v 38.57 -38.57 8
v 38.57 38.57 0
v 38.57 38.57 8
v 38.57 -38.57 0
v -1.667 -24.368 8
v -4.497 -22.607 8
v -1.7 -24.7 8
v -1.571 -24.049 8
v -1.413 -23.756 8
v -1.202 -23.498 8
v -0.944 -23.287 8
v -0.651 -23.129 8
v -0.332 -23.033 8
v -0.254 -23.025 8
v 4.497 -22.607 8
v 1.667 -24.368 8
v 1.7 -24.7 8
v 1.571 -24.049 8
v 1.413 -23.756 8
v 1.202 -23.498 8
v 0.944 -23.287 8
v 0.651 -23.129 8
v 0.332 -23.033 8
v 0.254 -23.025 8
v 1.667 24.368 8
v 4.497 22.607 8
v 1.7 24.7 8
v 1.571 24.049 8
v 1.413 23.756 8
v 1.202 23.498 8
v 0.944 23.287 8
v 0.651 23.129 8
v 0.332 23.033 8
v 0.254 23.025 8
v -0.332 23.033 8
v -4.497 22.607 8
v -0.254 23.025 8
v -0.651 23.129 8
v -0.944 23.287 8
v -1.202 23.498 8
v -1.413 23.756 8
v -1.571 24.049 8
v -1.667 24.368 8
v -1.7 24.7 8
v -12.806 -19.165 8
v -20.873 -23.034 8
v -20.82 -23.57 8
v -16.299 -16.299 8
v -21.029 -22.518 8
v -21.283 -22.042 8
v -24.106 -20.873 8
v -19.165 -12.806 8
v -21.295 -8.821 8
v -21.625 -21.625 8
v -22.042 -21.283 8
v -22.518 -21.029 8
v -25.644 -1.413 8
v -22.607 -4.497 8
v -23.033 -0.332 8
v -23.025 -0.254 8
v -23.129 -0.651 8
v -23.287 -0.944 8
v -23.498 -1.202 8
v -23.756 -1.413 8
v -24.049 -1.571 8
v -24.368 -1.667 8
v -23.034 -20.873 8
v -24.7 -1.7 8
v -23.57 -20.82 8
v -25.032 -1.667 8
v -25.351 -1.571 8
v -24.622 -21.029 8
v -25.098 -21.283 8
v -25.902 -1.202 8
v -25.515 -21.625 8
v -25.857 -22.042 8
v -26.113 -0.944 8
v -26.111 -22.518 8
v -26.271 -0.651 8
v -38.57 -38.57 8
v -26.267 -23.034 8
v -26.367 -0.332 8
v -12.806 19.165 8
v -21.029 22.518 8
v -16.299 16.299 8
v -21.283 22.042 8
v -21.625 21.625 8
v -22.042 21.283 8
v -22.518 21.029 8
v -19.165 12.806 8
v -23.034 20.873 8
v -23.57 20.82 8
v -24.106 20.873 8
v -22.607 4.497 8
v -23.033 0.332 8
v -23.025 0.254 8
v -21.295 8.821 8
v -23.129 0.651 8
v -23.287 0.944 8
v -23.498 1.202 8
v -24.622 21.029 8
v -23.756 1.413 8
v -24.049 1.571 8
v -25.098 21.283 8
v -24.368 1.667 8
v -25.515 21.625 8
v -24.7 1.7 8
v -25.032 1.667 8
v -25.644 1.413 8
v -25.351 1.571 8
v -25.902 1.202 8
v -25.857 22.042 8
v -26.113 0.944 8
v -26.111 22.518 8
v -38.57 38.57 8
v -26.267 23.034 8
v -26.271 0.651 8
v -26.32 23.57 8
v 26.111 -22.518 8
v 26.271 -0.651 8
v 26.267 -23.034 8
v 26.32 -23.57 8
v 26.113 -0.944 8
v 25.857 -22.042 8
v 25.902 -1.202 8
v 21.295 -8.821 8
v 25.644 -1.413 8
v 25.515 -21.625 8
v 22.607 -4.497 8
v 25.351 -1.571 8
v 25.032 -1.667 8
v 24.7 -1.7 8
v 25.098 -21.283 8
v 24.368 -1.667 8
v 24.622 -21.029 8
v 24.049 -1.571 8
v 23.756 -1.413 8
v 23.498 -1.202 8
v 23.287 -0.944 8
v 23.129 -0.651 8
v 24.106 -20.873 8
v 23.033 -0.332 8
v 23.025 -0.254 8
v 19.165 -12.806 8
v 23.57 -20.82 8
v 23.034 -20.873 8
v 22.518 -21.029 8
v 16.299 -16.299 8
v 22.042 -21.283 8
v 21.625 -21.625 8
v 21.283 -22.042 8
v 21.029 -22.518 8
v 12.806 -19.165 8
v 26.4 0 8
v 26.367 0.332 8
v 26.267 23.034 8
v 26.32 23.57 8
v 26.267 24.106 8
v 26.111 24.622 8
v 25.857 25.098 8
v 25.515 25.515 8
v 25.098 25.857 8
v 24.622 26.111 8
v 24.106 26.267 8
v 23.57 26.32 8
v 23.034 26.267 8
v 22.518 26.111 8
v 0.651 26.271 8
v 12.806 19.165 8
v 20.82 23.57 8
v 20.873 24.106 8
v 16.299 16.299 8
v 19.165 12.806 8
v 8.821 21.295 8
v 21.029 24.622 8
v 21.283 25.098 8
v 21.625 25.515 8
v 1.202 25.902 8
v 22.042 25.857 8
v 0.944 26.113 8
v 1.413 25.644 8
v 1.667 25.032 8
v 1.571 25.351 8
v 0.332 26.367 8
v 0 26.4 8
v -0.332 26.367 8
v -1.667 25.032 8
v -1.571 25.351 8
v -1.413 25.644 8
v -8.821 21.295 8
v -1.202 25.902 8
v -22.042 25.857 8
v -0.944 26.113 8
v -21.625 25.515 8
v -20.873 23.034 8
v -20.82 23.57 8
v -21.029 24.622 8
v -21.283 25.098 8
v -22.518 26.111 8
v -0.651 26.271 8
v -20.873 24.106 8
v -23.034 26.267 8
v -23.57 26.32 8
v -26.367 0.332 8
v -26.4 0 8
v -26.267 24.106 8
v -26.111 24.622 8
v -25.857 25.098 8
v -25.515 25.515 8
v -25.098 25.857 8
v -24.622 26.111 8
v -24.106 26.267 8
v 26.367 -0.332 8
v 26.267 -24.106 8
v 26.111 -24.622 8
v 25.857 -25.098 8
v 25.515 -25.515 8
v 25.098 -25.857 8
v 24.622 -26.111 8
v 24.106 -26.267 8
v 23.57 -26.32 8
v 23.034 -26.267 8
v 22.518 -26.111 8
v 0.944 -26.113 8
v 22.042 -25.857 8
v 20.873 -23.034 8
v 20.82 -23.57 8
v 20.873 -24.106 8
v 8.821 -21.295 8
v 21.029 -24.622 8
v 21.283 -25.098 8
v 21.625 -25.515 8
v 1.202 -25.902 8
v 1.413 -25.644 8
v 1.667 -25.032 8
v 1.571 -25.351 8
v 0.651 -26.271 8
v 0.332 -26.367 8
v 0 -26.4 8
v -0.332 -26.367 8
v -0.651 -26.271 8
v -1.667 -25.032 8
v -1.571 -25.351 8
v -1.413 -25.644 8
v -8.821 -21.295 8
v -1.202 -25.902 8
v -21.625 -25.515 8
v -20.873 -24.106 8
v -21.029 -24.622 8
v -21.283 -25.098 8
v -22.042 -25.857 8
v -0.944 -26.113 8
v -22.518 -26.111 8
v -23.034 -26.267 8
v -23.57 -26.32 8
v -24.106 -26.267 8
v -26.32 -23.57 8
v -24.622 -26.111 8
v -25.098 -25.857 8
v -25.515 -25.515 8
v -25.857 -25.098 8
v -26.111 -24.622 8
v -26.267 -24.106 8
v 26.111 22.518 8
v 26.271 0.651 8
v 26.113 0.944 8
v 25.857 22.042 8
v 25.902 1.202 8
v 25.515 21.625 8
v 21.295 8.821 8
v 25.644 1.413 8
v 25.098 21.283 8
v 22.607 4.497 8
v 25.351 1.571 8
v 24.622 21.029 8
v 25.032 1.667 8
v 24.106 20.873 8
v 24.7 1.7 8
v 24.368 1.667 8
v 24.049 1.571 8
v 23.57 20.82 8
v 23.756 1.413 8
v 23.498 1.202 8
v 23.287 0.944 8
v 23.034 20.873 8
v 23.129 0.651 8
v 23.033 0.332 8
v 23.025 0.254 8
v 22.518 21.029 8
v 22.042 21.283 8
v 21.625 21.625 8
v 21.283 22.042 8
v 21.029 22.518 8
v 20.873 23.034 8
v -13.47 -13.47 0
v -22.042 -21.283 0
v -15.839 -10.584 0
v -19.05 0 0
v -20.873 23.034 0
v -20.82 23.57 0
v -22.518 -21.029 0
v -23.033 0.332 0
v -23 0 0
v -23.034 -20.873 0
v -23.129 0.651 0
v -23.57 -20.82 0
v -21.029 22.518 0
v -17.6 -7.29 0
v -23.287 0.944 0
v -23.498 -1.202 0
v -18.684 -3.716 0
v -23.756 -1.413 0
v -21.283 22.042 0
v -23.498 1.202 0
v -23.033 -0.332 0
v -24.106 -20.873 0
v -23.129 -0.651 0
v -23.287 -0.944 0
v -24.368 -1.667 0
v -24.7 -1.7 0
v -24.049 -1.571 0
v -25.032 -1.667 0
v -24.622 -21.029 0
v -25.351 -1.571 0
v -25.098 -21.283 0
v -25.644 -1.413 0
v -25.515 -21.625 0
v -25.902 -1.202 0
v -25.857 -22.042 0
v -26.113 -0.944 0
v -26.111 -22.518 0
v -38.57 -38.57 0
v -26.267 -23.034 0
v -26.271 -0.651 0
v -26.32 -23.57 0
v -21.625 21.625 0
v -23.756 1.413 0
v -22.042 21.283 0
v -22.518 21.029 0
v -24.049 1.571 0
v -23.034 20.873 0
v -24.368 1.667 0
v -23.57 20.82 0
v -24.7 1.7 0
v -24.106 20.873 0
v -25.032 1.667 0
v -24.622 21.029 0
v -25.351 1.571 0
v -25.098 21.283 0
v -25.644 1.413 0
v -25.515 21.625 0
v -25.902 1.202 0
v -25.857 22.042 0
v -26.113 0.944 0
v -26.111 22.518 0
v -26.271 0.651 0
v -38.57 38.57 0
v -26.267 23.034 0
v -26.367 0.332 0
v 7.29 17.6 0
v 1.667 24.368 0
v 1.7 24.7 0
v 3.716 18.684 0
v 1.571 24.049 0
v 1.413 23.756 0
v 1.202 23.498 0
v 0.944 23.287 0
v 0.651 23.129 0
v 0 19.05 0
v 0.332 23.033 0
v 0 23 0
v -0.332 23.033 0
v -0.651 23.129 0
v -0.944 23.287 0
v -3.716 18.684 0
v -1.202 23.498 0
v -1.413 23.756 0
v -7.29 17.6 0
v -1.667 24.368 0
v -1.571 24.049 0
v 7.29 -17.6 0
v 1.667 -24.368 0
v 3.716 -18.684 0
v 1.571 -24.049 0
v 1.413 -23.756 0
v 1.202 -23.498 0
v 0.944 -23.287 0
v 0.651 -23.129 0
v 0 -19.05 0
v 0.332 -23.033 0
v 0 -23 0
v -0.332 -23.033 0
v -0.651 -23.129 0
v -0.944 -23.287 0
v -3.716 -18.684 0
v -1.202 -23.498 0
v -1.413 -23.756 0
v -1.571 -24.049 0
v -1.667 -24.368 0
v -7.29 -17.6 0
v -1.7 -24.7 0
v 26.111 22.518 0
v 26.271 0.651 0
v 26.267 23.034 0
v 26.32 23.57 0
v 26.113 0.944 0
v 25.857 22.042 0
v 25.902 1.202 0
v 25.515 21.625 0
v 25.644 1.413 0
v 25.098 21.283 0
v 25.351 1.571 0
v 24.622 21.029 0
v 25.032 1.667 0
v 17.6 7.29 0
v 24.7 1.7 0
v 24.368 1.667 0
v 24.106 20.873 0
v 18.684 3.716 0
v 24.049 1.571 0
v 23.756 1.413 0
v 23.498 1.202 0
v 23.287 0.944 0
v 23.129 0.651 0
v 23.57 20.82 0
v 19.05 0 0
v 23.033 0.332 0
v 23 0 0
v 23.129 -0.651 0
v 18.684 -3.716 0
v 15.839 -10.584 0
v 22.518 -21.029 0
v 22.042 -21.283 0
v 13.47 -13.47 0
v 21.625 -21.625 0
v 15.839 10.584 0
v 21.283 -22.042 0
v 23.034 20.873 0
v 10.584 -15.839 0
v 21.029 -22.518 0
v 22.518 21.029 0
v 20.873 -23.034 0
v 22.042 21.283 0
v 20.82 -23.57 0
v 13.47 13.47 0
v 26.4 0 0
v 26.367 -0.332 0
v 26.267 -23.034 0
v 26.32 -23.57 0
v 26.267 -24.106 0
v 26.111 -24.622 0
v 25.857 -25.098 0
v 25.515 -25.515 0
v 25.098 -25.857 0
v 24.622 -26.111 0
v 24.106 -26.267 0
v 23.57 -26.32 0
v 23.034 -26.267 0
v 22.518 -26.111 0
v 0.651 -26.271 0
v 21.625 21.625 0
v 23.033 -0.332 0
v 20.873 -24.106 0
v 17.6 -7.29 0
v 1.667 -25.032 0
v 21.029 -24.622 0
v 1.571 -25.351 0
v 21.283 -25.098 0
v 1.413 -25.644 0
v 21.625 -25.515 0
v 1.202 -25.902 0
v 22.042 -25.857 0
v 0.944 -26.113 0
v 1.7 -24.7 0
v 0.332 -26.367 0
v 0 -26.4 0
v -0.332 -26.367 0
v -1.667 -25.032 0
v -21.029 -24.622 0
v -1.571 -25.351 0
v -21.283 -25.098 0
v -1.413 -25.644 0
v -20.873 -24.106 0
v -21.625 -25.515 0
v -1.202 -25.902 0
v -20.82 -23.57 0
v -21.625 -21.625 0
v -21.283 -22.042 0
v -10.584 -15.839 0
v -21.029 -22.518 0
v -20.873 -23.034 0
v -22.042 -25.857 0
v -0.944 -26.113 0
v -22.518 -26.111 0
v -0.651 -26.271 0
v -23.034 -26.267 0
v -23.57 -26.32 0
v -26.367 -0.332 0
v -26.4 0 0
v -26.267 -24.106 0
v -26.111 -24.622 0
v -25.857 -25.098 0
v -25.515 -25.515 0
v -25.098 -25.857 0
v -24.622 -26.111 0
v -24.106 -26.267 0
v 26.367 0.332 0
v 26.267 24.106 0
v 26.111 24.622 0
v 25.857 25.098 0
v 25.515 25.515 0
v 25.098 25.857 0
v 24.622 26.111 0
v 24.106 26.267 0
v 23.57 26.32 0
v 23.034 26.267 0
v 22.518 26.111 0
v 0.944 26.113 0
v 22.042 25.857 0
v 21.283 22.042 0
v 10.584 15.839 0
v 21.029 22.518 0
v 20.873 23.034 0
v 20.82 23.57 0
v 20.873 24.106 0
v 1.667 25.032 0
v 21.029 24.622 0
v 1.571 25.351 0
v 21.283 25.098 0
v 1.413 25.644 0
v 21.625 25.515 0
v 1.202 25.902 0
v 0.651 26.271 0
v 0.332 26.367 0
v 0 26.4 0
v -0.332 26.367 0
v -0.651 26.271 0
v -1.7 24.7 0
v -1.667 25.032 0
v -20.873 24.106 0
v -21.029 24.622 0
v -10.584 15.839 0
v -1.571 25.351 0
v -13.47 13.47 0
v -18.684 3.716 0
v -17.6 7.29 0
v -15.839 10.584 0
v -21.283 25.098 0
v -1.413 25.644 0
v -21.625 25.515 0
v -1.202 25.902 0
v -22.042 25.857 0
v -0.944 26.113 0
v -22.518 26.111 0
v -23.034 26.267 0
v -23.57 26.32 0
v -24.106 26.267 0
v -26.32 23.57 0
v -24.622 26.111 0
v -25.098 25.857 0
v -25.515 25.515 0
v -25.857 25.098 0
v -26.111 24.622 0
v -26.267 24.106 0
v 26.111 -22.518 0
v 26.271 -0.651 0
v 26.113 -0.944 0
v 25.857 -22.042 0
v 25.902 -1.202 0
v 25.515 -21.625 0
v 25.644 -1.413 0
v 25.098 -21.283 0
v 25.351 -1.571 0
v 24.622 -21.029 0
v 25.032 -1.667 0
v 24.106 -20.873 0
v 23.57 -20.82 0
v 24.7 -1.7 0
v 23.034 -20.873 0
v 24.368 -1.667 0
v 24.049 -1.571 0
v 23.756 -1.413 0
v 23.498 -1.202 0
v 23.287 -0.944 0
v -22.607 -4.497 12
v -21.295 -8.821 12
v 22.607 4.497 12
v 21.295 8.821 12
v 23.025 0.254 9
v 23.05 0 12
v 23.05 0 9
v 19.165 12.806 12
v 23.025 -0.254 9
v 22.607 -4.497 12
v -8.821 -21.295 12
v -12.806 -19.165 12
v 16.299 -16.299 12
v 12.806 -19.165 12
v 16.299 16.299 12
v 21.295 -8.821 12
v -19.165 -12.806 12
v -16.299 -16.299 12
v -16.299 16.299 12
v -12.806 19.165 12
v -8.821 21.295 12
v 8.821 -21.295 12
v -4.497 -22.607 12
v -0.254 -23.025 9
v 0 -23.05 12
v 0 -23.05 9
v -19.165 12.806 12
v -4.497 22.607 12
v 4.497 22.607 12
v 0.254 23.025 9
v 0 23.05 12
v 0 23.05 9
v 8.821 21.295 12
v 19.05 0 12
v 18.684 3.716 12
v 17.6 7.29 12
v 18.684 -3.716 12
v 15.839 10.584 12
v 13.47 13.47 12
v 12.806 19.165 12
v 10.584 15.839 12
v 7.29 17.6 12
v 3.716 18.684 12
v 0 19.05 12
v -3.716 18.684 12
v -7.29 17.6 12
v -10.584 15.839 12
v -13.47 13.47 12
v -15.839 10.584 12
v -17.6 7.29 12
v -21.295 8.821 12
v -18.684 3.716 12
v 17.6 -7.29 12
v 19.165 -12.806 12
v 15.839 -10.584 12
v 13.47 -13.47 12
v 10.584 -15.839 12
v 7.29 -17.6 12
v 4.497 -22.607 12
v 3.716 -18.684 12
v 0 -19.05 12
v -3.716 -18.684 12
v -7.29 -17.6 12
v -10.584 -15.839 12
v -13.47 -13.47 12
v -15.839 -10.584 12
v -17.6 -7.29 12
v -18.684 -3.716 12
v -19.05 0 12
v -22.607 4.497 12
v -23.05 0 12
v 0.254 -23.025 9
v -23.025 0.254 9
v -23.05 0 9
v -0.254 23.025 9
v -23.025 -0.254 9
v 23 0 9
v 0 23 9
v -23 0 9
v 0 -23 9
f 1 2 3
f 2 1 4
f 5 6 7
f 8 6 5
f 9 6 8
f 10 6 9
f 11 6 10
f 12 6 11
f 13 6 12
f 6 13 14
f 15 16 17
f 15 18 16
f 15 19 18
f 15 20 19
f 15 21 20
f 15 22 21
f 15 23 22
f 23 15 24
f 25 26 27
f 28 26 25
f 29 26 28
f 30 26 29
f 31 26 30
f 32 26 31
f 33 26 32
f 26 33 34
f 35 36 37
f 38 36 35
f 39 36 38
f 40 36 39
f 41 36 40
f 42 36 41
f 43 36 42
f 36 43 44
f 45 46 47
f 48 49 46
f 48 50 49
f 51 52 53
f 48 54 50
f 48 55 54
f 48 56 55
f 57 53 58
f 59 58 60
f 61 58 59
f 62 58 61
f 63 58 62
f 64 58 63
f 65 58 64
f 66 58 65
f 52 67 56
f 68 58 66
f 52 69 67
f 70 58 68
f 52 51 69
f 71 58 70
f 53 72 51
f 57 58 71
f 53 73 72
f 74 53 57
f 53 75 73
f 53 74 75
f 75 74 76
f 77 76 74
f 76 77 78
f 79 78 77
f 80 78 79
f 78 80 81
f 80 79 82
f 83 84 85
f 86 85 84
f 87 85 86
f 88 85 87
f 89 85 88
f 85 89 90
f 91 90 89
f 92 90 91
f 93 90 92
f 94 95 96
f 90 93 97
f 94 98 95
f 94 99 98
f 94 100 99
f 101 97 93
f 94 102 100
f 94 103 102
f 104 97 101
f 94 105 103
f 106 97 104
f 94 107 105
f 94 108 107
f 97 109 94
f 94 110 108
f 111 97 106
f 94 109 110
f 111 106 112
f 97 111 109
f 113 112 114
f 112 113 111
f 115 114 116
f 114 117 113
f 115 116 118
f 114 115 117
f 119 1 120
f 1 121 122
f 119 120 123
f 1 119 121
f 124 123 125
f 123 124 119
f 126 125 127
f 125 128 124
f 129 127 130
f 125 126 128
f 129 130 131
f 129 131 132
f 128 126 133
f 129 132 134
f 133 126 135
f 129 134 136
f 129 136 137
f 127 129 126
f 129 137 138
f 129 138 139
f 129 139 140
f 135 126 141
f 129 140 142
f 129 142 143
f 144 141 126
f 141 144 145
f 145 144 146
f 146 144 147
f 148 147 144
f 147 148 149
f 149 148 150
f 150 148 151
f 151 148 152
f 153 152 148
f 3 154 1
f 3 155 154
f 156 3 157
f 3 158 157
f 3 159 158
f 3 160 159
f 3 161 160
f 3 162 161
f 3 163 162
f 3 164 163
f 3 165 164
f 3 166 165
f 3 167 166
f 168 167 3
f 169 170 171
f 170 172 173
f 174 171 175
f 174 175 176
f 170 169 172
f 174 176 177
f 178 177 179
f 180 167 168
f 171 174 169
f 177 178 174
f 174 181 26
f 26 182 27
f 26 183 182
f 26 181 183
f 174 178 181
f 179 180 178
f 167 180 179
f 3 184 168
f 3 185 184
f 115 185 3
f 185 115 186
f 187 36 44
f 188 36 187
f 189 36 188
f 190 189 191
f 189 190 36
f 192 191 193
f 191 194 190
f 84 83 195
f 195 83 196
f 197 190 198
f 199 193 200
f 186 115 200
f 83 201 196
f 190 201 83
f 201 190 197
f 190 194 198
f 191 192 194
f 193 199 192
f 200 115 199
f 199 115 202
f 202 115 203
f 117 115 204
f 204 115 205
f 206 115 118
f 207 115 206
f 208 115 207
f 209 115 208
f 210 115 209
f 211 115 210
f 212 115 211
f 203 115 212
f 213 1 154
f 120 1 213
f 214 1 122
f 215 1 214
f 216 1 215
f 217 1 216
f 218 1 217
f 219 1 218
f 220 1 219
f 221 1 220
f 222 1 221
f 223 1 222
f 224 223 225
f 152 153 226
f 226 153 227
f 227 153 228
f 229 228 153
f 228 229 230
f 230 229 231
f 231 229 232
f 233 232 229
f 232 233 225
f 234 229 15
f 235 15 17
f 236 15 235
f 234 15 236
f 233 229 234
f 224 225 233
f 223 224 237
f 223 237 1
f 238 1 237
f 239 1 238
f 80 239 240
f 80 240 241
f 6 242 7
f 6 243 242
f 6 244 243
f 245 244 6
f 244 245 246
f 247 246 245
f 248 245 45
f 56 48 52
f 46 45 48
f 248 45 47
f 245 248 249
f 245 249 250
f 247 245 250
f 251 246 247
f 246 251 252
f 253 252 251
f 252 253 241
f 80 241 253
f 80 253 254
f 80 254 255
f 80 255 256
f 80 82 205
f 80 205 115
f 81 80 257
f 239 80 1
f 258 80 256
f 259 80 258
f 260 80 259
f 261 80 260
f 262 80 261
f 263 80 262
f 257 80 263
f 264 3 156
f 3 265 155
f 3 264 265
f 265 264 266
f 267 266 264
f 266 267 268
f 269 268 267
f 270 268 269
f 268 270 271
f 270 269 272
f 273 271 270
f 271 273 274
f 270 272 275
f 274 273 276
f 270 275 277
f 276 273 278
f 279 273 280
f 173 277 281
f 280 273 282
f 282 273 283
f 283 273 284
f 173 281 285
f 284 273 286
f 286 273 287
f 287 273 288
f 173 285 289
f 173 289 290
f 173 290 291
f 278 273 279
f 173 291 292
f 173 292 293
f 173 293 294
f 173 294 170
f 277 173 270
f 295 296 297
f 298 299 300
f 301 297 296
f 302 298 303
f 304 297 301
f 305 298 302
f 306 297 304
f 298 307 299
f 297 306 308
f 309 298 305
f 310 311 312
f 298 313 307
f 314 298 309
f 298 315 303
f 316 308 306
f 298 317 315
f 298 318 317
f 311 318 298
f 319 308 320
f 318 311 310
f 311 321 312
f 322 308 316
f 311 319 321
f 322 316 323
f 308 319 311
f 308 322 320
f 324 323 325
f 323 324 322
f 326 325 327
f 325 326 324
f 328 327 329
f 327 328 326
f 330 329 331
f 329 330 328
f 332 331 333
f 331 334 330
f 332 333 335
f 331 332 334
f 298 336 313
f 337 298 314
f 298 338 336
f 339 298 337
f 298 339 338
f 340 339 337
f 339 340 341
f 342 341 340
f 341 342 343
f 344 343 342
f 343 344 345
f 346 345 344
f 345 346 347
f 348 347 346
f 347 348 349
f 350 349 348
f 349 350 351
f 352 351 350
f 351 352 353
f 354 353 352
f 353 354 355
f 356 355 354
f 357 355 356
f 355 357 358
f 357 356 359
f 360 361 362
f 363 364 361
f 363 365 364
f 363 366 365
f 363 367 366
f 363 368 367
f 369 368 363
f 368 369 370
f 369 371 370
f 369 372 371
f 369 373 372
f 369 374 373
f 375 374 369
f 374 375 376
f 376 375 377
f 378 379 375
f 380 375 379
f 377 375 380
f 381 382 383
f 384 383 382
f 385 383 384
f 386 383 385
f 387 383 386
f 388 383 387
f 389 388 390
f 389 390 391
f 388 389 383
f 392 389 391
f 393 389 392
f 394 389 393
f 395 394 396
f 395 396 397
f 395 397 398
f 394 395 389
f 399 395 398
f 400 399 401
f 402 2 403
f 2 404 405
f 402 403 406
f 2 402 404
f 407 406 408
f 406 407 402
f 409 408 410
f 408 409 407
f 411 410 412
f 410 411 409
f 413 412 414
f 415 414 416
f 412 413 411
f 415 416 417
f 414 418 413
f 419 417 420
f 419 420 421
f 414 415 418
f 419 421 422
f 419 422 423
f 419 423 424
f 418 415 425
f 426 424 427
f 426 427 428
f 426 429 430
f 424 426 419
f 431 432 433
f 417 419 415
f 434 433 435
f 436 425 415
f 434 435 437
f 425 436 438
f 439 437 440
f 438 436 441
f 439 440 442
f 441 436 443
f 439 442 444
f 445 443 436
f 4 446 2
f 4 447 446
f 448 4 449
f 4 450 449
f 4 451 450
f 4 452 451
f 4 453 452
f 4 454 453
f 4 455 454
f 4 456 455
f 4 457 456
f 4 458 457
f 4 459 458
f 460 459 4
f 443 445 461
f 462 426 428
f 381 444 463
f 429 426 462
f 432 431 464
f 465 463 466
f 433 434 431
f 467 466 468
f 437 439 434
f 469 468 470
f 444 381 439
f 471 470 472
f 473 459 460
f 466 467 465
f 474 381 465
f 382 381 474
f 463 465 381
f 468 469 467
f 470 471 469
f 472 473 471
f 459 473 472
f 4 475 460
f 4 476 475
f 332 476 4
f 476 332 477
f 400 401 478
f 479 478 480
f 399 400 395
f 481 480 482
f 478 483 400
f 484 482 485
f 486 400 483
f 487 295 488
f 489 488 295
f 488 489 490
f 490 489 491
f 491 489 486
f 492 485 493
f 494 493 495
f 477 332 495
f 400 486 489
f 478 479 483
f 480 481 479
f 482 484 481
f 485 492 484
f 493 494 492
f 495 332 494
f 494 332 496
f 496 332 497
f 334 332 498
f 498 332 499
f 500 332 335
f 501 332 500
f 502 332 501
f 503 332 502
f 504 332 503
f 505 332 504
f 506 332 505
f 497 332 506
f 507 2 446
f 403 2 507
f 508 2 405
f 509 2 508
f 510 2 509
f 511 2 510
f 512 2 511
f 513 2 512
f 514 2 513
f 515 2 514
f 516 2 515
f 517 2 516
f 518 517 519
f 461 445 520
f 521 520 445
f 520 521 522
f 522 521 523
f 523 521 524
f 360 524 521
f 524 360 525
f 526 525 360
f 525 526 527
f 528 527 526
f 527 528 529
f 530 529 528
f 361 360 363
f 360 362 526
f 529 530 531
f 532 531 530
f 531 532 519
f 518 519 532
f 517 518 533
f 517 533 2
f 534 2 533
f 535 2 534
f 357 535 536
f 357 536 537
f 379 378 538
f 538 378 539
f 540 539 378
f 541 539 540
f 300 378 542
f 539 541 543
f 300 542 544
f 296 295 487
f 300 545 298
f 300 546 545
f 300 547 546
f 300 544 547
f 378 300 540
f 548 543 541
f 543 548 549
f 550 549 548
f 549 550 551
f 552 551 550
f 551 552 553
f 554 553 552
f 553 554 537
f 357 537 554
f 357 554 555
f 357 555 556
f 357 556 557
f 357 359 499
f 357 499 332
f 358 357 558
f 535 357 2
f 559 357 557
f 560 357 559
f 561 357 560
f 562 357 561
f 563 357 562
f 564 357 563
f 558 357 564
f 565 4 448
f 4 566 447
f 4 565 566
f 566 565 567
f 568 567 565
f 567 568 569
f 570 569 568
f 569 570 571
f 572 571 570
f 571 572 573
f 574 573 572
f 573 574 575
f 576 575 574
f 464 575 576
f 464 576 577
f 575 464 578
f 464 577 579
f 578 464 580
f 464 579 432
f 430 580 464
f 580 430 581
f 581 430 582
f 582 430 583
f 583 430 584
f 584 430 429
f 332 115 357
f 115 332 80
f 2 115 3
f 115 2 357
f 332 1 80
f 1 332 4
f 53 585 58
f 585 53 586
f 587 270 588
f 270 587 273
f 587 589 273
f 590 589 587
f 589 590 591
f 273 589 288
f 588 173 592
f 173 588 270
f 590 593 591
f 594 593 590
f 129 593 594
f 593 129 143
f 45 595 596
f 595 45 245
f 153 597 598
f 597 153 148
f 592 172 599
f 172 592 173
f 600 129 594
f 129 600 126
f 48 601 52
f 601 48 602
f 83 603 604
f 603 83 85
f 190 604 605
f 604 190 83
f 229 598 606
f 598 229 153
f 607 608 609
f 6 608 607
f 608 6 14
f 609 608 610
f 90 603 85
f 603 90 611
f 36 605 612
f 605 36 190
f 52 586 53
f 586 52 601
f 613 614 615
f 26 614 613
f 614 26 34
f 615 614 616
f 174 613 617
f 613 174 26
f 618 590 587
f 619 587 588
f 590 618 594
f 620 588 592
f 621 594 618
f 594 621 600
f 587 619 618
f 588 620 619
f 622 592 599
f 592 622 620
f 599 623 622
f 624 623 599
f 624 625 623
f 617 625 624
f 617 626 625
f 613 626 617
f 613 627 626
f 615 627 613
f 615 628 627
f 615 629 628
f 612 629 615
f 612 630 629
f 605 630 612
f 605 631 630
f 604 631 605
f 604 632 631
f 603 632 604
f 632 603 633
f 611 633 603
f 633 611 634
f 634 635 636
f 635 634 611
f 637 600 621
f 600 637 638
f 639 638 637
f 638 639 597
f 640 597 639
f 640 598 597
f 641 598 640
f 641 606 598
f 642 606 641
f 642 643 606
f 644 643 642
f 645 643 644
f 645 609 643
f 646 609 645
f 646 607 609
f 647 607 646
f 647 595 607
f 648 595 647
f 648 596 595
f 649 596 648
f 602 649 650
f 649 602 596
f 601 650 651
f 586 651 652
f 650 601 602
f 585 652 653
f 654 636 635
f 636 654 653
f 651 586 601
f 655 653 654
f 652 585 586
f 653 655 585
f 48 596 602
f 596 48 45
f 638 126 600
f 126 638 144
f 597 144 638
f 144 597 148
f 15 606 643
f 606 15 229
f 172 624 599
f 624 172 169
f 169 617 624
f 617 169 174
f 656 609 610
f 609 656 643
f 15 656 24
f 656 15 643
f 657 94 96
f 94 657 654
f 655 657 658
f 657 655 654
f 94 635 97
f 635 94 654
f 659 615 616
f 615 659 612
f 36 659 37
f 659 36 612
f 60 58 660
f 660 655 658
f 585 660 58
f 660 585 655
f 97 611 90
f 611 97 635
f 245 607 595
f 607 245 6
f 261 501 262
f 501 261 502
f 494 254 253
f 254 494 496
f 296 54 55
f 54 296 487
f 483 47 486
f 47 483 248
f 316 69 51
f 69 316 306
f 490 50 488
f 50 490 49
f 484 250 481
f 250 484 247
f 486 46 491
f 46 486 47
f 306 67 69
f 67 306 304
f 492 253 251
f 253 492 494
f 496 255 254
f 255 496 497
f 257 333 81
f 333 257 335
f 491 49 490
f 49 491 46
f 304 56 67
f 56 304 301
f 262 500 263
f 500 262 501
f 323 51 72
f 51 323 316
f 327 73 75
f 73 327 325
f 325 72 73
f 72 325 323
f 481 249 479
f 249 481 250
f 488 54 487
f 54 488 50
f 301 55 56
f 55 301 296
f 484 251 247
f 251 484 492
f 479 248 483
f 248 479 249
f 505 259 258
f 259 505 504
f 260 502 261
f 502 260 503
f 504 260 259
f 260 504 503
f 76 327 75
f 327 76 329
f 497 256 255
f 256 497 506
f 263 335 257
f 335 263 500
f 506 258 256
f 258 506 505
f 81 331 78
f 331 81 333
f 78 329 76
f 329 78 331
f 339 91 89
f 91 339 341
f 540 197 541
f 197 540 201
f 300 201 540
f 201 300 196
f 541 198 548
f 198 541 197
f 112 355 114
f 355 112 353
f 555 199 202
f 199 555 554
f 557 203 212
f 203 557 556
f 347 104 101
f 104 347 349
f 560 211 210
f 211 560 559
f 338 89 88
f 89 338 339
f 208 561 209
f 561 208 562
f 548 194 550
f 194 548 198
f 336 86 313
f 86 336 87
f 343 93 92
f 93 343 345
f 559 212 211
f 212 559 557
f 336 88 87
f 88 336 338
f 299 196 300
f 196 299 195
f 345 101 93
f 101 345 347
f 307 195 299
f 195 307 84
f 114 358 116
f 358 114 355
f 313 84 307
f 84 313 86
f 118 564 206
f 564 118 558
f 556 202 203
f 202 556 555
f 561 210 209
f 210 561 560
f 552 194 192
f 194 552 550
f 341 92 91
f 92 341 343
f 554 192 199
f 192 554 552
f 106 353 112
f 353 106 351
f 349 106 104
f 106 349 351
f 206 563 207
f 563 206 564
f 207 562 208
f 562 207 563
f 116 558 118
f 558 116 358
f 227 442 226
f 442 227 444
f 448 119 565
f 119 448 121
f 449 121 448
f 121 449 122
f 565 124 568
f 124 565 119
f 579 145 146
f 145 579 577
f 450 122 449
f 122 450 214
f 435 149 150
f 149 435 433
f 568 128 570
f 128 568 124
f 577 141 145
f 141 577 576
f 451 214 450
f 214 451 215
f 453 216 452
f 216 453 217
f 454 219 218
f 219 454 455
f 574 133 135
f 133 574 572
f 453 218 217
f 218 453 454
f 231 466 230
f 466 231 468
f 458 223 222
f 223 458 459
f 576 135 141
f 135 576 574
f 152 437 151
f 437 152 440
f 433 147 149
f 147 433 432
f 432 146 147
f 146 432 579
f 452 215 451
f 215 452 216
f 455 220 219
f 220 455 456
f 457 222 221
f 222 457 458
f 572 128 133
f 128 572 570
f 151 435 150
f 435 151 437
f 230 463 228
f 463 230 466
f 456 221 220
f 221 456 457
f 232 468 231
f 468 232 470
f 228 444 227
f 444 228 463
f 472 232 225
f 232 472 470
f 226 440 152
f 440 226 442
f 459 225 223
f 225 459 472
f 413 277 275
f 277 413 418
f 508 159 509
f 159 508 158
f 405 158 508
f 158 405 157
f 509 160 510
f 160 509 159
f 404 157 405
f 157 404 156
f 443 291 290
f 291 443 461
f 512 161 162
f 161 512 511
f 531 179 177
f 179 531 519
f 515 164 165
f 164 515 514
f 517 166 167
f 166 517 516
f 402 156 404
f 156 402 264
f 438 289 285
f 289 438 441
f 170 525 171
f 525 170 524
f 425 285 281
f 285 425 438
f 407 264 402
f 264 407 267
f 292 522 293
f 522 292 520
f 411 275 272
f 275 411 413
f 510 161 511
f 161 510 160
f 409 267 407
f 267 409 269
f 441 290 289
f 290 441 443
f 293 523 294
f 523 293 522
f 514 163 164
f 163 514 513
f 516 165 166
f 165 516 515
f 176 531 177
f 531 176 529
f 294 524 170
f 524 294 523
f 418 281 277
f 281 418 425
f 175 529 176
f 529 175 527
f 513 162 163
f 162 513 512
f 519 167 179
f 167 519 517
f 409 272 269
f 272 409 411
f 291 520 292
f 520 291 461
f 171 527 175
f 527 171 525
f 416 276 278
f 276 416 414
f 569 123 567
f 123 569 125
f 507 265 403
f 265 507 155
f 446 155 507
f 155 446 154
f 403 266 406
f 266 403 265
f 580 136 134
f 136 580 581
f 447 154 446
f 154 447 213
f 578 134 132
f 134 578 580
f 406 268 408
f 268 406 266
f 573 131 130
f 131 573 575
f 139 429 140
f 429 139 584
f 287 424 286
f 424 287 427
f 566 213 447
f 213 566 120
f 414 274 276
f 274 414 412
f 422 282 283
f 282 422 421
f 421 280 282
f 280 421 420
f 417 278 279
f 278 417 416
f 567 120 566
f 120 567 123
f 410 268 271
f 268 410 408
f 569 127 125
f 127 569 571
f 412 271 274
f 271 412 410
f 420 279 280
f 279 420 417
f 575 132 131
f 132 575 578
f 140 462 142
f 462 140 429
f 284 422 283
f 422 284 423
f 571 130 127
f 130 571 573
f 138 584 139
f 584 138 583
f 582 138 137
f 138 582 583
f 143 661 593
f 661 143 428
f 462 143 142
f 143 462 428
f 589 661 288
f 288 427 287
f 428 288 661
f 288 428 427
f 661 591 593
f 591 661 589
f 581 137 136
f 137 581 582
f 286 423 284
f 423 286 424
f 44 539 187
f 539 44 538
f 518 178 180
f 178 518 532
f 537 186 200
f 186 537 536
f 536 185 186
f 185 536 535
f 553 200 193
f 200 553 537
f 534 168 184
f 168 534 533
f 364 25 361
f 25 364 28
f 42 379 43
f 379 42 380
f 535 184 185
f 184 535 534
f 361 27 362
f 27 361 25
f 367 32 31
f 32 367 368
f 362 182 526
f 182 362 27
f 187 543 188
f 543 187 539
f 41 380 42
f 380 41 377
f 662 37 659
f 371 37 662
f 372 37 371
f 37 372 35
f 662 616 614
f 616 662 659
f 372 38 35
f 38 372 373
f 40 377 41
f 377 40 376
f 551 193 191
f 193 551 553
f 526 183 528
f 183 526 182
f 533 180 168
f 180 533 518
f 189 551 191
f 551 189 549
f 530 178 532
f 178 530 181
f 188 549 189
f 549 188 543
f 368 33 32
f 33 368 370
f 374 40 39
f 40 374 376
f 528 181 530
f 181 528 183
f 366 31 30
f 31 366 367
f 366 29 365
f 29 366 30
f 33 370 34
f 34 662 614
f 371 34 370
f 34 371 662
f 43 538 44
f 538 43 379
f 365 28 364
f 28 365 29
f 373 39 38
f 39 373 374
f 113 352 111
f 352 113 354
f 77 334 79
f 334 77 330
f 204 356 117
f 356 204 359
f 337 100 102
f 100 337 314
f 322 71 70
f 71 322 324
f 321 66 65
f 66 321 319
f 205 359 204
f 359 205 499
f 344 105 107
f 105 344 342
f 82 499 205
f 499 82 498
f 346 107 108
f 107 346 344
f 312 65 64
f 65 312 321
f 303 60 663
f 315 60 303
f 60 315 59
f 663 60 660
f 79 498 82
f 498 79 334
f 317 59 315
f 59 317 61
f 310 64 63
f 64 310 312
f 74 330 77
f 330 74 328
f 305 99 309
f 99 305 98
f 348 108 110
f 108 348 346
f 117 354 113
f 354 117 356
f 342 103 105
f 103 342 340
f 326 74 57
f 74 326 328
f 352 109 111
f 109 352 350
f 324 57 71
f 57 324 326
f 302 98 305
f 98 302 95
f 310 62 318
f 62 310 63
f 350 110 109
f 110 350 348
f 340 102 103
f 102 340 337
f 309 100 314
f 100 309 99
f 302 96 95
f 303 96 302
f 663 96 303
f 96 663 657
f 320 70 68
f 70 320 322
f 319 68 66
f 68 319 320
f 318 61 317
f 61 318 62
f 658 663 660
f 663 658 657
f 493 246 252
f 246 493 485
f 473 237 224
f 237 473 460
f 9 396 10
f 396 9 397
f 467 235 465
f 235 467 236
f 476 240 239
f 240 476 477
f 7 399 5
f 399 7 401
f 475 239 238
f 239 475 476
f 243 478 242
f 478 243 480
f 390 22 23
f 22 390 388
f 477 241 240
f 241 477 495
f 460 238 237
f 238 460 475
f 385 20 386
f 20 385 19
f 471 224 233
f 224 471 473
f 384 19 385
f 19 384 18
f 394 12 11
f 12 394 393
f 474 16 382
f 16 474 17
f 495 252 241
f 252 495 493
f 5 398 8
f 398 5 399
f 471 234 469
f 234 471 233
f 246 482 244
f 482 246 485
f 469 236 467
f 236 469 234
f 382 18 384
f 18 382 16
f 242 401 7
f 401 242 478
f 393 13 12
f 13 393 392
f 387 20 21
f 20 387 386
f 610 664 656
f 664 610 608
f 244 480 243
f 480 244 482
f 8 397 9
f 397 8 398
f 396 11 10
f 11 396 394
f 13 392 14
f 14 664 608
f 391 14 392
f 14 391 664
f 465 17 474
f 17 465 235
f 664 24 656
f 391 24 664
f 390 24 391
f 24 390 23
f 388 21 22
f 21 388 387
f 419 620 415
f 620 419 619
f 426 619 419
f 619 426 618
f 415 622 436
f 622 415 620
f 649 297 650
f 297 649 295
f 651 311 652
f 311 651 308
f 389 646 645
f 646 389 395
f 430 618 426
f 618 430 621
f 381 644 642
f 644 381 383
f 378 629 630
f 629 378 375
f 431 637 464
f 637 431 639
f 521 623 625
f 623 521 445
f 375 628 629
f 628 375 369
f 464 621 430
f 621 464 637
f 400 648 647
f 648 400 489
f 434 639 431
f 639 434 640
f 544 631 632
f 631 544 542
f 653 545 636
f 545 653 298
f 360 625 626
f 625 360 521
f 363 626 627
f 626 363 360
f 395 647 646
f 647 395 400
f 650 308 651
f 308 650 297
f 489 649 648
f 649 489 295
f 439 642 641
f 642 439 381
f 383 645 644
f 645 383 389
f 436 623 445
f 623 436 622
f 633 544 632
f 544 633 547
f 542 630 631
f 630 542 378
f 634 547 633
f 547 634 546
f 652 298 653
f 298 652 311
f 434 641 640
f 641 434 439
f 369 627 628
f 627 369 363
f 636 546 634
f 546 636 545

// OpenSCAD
$fn = 32;

// ----------------------------------------------------------------------
// Motor mount plate: NEMA23, 77.14 x 77.14 x 12 mm
// ----------------------------------------------------------------------

// --- parameters (mm) ---
mount_w = 77.14;          // plate length, X
mount_d = 77.14;          // plate width, Y
mat_t = 8;                // plate thickness
motor_pitch = 47.14;      // NEMA23 bolt spacing
motor_d = 5.5;            // NEMA23 screw clearance
center_bore = 38.1;       // pilot boss bore
boss_d = 46.1;            // raised pilot ring
boss_h = 4;               // raised pilot ring height
second_d = 3.4;           // second fastener hole
bc_r = 24.7;              // second bolt circle radius
bc_n = 4;                 // second bolt circle count

module plate() {
  translate([-mount_w / 2, -mount_d / 2, 0]) cube([mount_w, mount_d, mat_t]);
}

module motor_holes() {
  for (sx = [-1, 1]) for (sy = [-1, 1])
    translate([sx * motor_pitch / 2, sy * motor_pitch / 2, -1])
      cylinder(h = mat_t + 2, d = motor_d);
}
module pilot_ring() {
  translate([0, 0, mat_t - 1]) cylinder(h = boss_h + 1, d = boss_d);
}

difference() {
  union() {
    plate();
    pilot_ring();
  }
  motor_holes();
  translate([0, 0, -1]) cylinder(h = mat_t + boss_h + 2, d = center_bore);
  for (i = [0 : bc_n - 1]) rotate([0, 0, i * 360 / bc_n]) translate([bc_r, 0, -1])    cylinder(h = mat_t + 2, d = second_d);
}
